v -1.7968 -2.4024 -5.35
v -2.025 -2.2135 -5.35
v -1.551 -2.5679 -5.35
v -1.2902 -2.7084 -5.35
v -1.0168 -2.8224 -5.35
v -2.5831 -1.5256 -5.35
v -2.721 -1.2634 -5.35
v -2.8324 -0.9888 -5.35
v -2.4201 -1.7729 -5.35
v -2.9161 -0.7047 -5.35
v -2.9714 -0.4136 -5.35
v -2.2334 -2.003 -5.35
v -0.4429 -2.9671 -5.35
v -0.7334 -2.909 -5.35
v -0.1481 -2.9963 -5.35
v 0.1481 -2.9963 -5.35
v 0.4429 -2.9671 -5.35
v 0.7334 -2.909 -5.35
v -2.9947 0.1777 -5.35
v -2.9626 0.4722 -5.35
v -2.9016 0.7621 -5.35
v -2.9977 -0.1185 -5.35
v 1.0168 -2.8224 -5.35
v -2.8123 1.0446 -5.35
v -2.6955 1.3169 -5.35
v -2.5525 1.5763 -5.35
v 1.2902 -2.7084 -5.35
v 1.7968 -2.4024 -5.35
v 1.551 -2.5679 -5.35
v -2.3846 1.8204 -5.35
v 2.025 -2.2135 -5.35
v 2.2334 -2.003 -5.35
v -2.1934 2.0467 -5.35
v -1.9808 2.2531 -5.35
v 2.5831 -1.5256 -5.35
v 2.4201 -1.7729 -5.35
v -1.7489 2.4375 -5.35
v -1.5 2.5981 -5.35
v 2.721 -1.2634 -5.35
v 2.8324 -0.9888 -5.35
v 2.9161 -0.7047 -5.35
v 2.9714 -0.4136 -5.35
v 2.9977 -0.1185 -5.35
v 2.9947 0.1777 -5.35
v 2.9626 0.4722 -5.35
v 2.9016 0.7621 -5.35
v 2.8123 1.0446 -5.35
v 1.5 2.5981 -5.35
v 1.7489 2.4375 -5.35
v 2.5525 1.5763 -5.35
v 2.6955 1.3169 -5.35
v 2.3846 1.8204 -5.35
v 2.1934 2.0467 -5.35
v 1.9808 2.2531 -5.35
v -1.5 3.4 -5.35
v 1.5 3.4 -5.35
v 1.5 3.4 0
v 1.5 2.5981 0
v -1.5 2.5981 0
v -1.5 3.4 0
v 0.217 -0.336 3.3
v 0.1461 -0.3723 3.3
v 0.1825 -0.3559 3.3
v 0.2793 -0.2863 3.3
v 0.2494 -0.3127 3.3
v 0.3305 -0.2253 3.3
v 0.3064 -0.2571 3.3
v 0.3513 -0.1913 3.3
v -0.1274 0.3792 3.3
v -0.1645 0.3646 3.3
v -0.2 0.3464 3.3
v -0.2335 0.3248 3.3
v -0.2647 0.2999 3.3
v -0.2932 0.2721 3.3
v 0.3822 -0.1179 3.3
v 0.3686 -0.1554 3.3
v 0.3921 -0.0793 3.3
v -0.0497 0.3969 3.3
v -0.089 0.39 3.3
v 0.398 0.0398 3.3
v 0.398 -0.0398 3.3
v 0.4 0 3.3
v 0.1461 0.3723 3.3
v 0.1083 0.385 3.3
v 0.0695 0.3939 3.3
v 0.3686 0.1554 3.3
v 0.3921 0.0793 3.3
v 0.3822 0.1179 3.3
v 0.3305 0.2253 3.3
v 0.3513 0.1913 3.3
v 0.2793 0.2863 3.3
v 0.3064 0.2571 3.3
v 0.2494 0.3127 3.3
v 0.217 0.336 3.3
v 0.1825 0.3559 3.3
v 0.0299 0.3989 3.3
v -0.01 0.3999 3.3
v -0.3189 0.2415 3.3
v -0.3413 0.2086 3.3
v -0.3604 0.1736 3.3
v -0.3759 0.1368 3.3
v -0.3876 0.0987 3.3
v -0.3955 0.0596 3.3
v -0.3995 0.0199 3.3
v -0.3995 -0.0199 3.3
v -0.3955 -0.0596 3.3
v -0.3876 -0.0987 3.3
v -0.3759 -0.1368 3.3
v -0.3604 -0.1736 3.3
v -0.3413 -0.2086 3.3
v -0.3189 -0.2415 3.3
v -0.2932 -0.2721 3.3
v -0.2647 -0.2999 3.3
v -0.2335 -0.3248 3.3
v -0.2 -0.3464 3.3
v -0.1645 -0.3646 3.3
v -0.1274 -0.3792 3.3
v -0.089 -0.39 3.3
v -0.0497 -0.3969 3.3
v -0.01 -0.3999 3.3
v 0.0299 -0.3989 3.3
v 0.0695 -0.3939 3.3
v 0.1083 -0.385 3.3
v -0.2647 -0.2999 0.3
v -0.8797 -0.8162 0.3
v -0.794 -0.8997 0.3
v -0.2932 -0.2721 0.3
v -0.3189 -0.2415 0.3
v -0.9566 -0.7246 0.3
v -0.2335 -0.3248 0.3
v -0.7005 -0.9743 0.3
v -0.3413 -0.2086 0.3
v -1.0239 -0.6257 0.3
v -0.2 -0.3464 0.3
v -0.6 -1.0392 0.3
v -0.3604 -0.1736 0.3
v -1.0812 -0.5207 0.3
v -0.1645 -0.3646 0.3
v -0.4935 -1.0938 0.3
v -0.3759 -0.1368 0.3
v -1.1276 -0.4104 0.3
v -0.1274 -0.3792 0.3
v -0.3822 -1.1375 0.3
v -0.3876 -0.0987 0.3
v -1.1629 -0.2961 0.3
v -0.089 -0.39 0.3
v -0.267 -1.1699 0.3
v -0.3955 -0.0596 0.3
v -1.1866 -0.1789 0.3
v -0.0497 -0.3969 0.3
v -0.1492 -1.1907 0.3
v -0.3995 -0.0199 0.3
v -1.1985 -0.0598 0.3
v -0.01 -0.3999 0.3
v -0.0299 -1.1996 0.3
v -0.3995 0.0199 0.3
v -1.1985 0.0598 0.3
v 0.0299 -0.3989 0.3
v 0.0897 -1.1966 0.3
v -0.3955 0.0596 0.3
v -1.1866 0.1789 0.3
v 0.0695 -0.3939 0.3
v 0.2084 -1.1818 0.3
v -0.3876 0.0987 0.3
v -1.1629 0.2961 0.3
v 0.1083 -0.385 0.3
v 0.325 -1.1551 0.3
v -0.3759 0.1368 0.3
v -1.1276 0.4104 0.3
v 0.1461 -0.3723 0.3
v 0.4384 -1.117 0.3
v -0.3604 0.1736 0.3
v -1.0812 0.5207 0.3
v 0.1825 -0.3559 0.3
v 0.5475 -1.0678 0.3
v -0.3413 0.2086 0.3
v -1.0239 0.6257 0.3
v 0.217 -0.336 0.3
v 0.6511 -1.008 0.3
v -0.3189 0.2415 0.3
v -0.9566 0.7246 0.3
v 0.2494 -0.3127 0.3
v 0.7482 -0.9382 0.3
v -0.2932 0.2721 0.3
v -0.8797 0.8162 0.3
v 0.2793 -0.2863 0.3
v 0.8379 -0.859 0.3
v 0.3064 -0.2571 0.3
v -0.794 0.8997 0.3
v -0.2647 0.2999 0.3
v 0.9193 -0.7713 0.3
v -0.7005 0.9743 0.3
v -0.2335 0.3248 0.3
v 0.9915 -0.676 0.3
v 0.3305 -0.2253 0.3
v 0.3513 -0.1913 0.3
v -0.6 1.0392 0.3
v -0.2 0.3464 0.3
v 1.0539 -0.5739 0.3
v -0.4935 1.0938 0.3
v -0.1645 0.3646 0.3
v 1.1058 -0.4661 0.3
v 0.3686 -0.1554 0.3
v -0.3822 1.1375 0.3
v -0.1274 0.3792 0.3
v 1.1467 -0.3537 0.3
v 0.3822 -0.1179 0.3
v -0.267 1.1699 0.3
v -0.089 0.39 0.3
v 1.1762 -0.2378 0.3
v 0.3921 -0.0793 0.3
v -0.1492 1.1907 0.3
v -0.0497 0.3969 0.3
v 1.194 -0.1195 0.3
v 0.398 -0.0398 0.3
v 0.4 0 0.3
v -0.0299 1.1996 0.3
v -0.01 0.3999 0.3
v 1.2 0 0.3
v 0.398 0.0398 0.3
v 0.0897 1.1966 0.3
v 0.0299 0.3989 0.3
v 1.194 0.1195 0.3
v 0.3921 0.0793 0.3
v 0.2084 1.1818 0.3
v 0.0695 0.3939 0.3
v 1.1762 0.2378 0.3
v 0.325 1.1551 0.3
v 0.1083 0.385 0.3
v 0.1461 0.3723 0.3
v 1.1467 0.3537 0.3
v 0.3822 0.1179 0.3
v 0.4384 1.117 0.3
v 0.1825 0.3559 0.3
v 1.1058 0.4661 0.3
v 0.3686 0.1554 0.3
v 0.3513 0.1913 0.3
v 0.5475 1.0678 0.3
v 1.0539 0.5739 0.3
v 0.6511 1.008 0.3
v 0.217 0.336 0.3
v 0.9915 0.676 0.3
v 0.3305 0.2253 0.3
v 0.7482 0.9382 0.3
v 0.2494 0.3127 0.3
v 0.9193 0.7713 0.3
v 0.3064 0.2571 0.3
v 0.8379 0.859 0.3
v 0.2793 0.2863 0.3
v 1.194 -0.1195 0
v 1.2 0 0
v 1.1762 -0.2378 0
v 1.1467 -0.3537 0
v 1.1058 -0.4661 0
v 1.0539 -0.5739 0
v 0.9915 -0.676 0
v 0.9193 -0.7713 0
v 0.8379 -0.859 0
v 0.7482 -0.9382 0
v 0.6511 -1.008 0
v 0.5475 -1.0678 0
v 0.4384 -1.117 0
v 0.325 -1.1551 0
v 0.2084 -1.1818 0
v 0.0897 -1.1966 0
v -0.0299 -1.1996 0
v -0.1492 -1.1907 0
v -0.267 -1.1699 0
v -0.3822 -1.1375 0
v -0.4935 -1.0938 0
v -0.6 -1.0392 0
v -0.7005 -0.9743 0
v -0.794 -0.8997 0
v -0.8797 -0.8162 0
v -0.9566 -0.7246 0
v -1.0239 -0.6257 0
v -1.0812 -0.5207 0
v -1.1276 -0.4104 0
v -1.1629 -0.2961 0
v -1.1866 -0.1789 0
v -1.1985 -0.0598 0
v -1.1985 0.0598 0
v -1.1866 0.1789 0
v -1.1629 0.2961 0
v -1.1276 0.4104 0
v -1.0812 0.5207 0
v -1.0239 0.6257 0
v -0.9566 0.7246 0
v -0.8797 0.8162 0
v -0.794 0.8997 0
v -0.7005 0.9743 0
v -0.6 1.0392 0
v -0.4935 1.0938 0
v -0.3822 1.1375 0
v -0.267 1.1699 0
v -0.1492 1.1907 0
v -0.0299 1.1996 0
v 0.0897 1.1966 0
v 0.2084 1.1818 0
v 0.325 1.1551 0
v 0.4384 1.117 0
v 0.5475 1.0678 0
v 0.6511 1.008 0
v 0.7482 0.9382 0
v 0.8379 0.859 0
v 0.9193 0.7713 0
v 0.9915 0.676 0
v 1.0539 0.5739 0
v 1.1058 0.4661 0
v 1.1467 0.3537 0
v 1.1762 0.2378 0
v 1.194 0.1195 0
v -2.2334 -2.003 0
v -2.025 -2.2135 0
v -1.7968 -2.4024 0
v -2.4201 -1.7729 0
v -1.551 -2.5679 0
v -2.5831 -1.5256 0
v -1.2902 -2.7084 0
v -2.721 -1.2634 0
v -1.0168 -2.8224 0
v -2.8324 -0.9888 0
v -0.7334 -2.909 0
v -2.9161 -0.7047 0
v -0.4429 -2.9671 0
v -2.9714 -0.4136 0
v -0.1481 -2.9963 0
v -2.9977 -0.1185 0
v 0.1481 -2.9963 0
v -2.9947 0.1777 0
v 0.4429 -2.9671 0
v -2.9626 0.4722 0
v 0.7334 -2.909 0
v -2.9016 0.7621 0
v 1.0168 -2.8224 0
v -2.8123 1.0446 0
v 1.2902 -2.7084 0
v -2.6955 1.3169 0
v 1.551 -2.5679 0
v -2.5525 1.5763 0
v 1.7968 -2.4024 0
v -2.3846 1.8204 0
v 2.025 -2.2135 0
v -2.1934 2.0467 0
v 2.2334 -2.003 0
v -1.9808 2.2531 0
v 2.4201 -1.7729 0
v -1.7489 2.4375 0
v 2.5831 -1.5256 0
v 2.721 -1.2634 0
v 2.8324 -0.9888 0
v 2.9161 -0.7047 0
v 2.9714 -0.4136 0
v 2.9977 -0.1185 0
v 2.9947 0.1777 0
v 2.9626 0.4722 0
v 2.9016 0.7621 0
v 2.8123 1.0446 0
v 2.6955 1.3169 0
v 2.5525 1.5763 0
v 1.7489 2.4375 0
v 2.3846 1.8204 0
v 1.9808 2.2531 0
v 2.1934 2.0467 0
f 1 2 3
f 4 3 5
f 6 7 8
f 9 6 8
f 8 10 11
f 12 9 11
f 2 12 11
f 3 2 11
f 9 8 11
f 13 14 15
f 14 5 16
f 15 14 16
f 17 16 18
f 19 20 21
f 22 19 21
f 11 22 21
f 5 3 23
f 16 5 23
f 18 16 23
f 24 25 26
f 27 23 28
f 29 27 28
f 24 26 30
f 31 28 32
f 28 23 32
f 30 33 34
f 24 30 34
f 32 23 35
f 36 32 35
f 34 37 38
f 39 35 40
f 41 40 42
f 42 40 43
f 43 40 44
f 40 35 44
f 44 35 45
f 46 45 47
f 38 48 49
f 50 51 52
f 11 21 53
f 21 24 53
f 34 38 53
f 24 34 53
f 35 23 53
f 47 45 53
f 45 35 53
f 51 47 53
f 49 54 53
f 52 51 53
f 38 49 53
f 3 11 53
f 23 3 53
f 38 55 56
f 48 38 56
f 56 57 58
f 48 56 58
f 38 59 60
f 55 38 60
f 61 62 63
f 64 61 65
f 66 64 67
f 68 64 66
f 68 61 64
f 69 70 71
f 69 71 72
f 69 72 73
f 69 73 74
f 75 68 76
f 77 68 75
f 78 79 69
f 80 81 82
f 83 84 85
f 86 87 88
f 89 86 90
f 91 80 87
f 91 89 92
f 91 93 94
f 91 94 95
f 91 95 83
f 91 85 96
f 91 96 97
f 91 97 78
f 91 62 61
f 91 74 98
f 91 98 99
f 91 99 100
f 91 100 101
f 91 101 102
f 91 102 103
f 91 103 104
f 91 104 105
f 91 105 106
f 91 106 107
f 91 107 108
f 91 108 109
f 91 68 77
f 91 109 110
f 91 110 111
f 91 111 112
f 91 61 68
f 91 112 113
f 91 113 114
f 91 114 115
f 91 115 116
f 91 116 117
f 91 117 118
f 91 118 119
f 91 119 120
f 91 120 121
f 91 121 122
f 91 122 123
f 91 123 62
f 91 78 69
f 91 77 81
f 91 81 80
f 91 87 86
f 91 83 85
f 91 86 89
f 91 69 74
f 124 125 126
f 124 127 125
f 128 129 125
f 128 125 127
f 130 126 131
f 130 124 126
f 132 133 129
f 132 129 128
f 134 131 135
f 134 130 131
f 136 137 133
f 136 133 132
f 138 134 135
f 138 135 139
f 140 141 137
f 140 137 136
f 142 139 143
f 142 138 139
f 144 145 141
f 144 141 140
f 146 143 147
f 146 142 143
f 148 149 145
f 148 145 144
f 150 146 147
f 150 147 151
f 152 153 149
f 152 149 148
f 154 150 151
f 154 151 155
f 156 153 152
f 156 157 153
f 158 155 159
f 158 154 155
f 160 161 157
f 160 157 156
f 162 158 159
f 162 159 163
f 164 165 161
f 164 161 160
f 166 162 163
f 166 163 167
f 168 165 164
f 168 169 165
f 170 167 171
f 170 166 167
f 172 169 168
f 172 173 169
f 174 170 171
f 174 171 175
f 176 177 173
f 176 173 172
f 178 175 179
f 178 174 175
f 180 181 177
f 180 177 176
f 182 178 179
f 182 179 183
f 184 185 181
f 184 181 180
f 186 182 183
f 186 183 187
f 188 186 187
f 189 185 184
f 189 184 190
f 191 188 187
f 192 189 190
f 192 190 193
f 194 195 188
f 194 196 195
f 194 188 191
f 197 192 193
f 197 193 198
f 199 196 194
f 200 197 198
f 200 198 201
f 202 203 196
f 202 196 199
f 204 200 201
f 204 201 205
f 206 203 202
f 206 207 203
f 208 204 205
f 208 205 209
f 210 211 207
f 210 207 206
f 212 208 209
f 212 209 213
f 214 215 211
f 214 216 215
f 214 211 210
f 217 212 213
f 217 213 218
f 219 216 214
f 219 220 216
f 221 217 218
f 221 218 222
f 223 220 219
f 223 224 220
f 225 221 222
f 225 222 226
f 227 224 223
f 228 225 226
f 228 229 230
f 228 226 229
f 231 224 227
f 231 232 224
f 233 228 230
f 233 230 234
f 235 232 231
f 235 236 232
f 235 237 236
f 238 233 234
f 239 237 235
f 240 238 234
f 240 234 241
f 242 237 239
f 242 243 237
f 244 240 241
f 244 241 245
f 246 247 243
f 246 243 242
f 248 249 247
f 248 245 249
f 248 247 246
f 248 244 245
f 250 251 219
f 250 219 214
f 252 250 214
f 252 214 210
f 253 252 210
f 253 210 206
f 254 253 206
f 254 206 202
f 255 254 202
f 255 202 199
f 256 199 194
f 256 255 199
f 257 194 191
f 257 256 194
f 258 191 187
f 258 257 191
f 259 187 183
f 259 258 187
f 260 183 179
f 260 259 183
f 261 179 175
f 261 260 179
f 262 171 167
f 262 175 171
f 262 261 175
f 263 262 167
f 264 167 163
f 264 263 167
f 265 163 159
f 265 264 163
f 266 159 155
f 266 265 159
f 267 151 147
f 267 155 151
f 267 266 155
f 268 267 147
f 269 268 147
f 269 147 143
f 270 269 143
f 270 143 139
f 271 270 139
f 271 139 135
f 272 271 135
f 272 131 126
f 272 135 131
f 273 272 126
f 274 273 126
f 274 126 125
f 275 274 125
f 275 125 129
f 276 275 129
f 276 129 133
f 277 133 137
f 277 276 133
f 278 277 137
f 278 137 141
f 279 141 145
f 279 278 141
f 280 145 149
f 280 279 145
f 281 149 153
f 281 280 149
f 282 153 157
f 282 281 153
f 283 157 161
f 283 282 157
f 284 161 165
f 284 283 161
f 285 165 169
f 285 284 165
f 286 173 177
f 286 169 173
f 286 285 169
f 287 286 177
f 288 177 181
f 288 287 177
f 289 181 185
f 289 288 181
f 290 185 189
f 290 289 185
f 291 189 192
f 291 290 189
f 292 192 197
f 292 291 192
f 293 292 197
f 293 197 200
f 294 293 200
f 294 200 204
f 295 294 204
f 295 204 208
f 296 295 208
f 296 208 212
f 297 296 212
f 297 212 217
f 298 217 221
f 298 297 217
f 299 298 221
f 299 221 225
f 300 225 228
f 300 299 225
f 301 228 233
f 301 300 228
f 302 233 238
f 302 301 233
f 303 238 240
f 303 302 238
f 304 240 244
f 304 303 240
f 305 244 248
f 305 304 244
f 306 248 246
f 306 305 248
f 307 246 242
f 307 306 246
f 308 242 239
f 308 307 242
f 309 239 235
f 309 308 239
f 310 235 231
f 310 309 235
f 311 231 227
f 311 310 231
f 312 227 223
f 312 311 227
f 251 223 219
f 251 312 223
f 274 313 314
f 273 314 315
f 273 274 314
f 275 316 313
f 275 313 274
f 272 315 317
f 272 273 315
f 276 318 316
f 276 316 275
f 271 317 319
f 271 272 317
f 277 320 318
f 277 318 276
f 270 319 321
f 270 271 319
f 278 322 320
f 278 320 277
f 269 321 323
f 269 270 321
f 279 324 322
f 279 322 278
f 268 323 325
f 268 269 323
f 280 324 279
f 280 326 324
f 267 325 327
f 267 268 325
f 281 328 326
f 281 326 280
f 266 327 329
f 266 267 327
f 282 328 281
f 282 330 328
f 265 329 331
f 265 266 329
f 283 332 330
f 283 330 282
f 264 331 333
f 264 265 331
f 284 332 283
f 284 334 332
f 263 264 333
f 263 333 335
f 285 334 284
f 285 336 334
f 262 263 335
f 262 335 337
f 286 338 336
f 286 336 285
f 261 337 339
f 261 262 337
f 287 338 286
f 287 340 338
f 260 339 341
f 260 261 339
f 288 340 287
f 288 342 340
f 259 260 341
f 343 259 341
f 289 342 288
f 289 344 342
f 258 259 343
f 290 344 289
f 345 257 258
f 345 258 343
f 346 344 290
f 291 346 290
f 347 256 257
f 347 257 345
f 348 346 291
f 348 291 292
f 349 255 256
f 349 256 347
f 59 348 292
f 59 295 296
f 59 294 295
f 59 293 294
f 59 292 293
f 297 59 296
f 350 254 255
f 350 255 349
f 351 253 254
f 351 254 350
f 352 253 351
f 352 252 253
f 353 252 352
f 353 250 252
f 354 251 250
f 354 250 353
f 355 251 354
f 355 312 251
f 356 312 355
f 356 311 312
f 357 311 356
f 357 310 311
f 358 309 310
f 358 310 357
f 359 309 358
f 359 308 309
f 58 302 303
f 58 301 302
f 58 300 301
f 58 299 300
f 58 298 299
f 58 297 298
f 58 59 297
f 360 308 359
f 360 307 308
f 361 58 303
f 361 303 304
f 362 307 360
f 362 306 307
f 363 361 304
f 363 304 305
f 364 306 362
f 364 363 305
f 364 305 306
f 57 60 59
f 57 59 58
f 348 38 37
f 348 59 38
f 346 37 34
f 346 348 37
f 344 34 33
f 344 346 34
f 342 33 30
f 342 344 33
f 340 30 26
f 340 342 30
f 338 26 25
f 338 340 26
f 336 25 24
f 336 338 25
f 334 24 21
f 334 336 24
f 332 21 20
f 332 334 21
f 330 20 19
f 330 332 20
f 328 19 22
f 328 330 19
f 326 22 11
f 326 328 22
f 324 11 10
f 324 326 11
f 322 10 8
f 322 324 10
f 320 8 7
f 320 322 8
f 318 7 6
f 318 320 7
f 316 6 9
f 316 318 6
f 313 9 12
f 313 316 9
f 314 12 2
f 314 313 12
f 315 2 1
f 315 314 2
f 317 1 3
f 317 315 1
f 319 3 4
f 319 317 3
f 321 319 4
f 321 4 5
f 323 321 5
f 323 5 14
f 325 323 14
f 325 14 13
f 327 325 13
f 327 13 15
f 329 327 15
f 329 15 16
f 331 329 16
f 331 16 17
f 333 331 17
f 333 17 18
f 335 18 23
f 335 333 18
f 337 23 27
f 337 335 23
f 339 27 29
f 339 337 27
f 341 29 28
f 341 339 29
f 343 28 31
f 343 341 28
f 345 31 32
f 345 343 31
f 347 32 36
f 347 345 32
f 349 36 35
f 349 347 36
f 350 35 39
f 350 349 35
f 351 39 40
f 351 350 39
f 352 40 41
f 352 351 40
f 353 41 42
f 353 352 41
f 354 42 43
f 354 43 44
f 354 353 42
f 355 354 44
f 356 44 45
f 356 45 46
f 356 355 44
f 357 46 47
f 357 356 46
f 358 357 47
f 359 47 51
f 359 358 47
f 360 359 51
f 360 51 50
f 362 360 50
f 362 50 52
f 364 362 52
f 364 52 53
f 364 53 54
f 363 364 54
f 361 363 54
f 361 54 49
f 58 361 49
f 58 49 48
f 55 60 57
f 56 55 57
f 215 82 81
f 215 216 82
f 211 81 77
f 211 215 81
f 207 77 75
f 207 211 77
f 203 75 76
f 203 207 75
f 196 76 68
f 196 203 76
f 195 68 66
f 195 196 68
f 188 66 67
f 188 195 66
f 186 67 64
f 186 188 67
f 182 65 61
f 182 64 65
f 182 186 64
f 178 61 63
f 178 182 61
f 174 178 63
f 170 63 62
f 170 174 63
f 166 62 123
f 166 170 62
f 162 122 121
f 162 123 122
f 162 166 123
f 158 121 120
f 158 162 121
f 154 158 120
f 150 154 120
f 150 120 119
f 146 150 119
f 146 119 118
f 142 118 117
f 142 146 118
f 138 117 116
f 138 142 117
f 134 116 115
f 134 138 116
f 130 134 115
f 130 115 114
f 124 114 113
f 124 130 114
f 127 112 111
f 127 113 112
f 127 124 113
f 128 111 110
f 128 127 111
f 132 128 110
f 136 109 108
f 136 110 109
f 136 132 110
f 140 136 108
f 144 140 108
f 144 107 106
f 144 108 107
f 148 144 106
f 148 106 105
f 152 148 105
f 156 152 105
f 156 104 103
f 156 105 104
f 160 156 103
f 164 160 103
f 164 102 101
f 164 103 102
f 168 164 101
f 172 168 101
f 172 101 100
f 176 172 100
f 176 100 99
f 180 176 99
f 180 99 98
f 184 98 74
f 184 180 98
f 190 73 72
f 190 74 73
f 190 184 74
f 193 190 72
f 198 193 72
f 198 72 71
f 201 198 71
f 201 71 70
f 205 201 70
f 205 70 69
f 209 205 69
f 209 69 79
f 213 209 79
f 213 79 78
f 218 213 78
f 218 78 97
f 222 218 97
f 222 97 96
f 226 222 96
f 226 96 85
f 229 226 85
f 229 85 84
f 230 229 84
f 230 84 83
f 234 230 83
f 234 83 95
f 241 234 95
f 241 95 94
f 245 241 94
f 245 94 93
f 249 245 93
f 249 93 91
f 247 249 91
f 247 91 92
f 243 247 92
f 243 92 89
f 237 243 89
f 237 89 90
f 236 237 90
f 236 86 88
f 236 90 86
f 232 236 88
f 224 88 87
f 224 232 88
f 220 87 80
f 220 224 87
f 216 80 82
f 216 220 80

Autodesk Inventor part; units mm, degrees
ref_plane "YZ Plane" through (0, 0, 0) normal (1, 0, 0) x (0, 1, 0)
ref_plane "XZ Plane" through (0, 0, 0) normal (0, 1, 0) x (-1, 0, 0)
ref_plane "XY Plane" through (0, 0, 0) normal (0, 0, 1) x (1, 0, 0)
sketch "Sketch1" plane through (0, 0, 0) normal (0, 0, 1) x (1, 0, 0)
  circle A0 centre (0, 0) radius 3
  line L0 (-1.5, 2.5981) -> (-1.5, 3.4)
  line L1 (-1.5, 3.4) -> (1.5, 3.4)
  line L2 (1.5, 3.4) -> (1.5, 2.5981)
  line L3 (0, 4.68) -> (0, -4.28) projected
  line L4 (-4.2, 0) -> (4.2, 0) projected
  dimension "d0" = 6
  dimension "d1" = 3.4
  dimension "d2" = 3
extrude "Body" add sketch "Sketch1" against normal blind 5.35
sketch "Sketch2" plane through (0, 0, 0) normal (0, 0, 1) x (1, 0, 0)
  circle A0 centre (0, 0) radius 1.2
  dimension "d5" = 2.4
extrude "Face Boss" add sketch "Sketch2" along normal blind 0.3
sketch "Sketch3" plane through (0, 0, 0.3) normal (0, 0, 1) x (1, 0, 0)
  circle A0 centre (0, 0) radius 0.4
  dimension "d8" = 0.8
extrude "Extrusion3" add sketch "Sketch3" along normal blind 3
properties part number "Minebea_SMS6-20_StepperMotor_Mockup"
